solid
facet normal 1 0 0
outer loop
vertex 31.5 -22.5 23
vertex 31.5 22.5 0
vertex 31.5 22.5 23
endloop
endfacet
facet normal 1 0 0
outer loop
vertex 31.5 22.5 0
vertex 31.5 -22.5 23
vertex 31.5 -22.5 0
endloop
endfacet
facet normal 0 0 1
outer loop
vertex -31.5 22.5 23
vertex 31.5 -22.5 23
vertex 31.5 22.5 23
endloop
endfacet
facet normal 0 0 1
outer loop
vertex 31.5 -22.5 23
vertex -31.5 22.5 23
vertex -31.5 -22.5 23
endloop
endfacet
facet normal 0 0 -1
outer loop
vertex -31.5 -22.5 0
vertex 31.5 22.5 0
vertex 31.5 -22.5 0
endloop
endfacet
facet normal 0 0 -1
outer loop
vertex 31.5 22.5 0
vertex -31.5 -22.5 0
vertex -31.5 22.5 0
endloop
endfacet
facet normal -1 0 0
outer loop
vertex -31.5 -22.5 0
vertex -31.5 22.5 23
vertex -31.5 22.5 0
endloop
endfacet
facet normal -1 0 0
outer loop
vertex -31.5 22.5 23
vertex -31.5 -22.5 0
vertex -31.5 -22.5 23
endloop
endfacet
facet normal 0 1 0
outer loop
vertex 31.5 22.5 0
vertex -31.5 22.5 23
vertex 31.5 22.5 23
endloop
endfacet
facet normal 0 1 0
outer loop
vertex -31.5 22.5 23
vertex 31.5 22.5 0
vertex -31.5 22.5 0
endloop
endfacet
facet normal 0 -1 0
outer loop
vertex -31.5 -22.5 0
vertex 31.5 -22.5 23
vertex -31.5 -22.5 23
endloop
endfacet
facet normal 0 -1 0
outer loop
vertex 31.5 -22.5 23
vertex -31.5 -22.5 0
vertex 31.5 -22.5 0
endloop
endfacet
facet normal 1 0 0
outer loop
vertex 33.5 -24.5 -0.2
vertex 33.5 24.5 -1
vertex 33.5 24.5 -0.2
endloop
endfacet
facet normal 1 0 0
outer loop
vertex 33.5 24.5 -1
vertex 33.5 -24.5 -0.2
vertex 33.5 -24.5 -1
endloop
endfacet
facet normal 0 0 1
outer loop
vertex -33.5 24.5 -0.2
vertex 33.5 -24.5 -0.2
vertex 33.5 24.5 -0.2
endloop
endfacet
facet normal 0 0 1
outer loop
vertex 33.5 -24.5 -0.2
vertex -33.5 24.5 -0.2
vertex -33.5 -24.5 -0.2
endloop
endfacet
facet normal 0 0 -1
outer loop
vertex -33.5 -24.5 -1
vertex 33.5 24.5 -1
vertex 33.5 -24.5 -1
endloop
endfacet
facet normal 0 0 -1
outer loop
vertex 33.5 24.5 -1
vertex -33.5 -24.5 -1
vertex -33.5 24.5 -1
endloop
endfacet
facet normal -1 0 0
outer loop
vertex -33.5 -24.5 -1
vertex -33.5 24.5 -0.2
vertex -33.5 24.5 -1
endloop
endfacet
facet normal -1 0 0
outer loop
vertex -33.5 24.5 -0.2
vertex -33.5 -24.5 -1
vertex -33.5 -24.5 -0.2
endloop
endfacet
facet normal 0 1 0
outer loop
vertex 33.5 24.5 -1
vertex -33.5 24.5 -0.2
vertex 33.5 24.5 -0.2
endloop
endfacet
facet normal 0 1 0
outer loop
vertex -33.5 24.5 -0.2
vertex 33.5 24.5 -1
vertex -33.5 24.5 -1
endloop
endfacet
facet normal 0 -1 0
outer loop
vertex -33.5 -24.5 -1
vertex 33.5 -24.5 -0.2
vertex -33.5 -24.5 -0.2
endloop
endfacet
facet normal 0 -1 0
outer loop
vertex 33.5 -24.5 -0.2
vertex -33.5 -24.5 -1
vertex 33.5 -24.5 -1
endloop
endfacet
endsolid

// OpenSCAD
// Parameters
length = 63; //[31.5:126:0.5]
width = 45; //[22.5:90:0.5]
height = 23; //[11.5:46:0.5]
base_plane_thickness = 0.8; //[0.4:2:0.1]
base_plane_margin = 2; //[0:10:0.5]
connect_overlap = 1; //[0.5:2:0.1]

// Main Body - SSR Module
module main_body() {
  color("DimGray") {
    translate([0, 0, height/2])
      cube([length, width, height], center=true);
  }
}

// Mounting Base Plane Reference
module mounting_base_plane_reference() {
  color("Silver") {
    translate([0, 0, base_plane_thickness/2 - connect_overlap])
      cube([length + 2*base_plane_margin, width + 2*base_plane_margin, base_plane_thickness], center=true);
  }
}

// Complete Module
module mod() {
  union() {
    main_body();
    mounting_base_plane_reference();
  }
}

// Assembly
module assembly() {
  mod();
}

assembly();
